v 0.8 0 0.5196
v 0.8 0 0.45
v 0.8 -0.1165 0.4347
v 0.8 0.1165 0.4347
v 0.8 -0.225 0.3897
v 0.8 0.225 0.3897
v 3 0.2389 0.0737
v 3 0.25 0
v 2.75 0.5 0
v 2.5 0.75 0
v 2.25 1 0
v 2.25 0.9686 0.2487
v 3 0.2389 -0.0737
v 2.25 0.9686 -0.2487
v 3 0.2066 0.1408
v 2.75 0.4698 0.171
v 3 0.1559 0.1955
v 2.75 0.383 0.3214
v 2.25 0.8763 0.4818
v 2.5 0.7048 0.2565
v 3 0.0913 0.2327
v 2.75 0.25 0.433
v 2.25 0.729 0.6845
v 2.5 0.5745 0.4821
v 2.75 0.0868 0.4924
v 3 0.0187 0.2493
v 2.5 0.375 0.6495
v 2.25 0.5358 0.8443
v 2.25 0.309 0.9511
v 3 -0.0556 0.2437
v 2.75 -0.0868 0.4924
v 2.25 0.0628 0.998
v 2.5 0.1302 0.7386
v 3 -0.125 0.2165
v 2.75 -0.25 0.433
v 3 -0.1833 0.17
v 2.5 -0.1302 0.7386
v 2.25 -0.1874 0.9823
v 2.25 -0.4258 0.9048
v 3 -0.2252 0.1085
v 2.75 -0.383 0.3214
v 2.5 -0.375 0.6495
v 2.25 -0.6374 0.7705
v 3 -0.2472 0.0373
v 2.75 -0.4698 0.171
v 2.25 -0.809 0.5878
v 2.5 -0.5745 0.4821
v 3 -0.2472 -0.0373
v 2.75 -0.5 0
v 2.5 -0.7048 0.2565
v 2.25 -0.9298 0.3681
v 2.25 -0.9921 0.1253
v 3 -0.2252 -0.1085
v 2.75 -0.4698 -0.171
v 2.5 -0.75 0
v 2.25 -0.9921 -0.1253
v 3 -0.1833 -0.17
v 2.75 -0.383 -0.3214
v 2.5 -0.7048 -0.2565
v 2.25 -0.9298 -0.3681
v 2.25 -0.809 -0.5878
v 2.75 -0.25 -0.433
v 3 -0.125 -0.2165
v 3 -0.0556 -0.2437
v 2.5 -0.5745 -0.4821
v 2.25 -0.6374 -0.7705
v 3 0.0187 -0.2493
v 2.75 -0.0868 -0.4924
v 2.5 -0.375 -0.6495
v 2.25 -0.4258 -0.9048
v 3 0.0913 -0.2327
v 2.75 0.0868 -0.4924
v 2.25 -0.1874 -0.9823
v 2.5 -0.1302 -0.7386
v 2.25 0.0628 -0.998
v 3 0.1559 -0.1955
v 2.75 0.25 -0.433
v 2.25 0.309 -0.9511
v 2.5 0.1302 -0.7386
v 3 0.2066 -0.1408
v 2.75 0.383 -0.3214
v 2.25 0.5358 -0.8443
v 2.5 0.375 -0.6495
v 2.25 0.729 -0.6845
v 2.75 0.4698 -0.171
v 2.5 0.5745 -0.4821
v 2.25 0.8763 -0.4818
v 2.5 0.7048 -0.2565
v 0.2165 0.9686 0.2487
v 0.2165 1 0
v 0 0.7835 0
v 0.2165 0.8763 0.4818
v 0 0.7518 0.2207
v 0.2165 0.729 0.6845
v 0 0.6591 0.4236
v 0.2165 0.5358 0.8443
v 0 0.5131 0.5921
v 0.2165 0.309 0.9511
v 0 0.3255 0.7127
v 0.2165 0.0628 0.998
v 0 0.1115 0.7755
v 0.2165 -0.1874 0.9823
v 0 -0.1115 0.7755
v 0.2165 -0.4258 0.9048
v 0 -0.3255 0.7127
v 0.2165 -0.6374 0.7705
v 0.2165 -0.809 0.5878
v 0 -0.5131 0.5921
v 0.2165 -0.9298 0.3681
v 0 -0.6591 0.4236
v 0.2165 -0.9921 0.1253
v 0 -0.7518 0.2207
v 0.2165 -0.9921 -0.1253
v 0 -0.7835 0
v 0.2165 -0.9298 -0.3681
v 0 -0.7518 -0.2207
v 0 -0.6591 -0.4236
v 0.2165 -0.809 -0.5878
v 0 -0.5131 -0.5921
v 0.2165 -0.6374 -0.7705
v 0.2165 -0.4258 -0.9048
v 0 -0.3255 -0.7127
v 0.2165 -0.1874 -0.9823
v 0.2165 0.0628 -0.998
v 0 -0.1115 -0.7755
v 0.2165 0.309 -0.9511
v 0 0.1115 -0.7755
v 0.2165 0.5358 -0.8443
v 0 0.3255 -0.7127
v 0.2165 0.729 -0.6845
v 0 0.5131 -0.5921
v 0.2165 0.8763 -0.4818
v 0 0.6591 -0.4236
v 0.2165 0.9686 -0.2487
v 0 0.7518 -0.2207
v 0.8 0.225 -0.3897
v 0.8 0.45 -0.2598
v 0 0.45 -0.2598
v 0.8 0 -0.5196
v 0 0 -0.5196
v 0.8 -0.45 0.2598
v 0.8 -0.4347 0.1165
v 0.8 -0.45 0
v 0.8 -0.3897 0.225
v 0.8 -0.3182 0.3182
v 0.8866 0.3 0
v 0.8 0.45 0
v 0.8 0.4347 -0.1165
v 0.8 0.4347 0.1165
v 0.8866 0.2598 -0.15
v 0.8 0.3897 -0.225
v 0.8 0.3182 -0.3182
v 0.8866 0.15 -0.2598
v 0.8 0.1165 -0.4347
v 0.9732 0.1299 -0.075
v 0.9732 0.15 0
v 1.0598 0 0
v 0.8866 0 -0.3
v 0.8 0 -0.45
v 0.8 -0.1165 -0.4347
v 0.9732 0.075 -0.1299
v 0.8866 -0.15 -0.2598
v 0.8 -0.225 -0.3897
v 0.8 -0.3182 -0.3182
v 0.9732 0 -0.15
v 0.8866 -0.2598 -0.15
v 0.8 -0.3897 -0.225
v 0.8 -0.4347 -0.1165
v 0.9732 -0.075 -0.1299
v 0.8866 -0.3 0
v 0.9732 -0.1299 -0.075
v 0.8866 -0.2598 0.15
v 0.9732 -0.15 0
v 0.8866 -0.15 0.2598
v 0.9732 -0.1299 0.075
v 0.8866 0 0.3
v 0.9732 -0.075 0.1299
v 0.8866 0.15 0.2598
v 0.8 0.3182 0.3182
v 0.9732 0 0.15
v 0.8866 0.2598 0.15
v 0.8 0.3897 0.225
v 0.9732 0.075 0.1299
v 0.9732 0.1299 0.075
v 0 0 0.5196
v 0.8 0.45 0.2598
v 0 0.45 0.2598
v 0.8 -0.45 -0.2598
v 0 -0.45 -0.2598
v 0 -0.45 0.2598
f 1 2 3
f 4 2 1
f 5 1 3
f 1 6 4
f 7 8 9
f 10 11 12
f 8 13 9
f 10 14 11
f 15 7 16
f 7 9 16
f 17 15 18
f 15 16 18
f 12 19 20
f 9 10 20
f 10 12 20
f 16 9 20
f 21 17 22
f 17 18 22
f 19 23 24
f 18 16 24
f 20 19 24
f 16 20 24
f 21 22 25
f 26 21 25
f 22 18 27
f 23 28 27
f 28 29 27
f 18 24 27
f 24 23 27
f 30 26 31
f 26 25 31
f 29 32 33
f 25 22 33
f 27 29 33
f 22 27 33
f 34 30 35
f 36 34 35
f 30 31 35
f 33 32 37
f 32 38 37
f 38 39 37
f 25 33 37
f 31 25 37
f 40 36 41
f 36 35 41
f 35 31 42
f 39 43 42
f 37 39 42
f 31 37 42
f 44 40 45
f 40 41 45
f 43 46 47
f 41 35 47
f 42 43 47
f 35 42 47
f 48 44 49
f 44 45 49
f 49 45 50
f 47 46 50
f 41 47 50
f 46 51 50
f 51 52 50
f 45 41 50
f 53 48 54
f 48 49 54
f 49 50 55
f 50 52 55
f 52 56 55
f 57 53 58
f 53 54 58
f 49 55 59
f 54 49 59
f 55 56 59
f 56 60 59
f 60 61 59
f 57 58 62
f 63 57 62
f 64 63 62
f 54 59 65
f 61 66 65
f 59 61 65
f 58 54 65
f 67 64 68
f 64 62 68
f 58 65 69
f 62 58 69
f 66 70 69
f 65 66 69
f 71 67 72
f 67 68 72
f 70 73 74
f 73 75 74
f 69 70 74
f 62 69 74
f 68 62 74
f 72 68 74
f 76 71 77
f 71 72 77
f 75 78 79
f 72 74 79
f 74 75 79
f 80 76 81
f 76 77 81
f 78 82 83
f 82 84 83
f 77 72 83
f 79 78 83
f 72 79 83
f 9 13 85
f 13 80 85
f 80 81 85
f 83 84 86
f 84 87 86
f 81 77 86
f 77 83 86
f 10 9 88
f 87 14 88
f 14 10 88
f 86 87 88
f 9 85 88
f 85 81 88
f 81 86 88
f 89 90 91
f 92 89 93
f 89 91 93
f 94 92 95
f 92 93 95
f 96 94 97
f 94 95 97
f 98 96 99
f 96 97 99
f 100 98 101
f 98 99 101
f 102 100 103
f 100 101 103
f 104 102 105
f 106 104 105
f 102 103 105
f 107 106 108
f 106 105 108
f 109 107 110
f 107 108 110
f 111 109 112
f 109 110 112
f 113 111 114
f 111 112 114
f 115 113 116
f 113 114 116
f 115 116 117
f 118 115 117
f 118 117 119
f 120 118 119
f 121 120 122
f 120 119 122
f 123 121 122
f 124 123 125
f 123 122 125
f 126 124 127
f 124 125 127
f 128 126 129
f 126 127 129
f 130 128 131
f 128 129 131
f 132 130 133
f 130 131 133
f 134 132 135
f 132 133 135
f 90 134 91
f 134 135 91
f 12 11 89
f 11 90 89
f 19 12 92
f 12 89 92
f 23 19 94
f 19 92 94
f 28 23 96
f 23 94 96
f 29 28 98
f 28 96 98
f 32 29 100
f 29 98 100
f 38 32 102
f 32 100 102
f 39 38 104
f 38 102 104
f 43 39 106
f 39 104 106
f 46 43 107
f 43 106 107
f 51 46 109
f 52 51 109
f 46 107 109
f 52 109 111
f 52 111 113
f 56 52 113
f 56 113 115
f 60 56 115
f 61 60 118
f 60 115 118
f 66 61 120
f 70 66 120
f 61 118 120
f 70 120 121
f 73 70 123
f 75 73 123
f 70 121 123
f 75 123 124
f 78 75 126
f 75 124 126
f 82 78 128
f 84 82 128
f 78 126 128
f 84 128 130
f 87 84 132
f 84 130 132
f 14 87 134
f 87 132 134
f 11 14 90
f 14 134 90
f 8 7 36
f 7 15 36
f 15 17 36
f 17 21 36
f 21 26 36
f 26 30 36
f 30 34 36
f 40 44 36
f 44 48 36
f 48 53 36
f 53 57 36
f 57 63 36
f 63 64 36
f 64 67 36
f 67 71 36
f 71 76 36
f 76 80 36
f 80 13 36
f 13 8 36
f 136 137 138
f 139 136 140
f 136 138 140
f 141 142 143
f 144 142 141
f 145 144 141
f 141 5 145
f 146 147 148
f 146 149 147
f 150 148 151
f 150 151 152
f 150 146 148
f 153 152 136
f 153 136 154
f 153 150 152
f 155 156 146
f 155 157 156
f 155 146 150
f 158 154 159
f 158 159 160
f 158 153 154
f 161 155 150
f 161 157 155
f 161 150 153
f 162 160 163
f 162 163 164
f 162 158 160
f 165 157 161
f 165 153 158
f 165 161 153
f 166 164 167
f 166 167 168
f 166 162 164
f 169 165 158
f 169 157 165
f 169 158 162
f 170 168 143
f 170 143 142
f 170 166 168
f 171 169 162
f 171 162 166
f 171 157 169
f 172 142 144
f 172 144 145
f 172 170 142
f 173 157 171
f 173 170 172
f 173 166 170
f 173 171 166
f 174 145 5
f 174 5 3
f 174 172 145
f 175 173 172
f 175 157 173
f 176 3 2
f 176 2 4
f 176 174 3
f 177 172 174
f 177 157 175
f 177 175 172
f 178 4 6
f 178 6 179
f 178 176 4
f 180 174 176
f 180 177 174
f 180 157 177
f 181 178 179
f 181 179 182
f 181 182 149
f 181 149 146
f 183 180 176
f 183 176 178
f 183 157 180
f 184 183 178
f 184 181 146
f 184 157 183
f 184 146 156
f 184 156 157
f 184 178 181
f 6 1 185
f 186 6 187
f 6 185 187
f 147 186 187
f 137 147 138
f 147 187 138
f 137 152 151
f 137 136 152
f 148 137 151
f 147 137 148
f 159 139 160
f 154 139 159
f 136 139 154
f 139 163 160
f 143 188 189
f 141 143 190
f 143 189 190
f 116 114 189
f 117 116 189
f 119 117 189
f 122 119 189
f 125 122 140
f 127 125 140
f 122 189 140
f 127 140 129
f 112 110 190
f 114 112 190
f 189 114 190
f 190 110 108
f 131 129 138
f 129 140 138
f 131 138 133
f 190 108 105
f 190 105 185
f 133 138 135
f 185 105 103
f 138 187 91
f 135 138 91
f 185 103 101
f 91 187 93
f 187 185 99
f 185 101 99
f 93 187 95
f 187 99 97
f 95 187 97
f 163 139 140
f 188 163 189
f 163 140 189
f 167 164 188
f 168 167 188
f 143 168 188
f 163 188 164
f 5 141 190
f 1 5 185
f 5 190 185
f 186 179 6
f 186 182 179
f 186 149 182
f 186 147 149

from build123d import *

# Parameters (mm, degrees)
HEXAGONSOCKET_DEPTH = 0.8


with BuildPart() as part:
    # Sketch1 → Base (revolve)
    with BuildSketch(Plane.XY):
        Polygon((0, 0), (3, 0), (3, 0.25), (2.25, 1), (0.2165, 1), (0, 0.7835), align=None)
    revolve(axis=Axis((-14.774129749, 0, 0), (1, 0, 0)))

    # Sketch2 → HexagonSocket (cut)
    with BuildSketch(Plane(origin=(0, 0.220293087, -0.139195271), x_dir=(0, 0, 1), z_dir=(-1, 0, 0))):
        Polygon((0.658810514, -0.220293087), (0.399002893, 0.229706913), (-0.12061235, 0.229706913), (-0.380419971, -0.220293087), (-0.12061235, -0.670293087), (0.399002893, -0.670293087), align=None)
    extrude(amount=-HEXAGONSOCKET_DEPTH, mode=Mode.SUBTRACT)

    # Sketch3 → Cut-Revolve (revolve, cut)
    with BuildSketch(Plane.XY):
        Polygon((0.8, 0.45), (1.059807621, 0), (0.8, 0), align=None)
    revolve(axis=Axis((0.8, 0, 0), (-1, 0, 0)), mode=Mode.SUBTRACT)


solid = part.part
